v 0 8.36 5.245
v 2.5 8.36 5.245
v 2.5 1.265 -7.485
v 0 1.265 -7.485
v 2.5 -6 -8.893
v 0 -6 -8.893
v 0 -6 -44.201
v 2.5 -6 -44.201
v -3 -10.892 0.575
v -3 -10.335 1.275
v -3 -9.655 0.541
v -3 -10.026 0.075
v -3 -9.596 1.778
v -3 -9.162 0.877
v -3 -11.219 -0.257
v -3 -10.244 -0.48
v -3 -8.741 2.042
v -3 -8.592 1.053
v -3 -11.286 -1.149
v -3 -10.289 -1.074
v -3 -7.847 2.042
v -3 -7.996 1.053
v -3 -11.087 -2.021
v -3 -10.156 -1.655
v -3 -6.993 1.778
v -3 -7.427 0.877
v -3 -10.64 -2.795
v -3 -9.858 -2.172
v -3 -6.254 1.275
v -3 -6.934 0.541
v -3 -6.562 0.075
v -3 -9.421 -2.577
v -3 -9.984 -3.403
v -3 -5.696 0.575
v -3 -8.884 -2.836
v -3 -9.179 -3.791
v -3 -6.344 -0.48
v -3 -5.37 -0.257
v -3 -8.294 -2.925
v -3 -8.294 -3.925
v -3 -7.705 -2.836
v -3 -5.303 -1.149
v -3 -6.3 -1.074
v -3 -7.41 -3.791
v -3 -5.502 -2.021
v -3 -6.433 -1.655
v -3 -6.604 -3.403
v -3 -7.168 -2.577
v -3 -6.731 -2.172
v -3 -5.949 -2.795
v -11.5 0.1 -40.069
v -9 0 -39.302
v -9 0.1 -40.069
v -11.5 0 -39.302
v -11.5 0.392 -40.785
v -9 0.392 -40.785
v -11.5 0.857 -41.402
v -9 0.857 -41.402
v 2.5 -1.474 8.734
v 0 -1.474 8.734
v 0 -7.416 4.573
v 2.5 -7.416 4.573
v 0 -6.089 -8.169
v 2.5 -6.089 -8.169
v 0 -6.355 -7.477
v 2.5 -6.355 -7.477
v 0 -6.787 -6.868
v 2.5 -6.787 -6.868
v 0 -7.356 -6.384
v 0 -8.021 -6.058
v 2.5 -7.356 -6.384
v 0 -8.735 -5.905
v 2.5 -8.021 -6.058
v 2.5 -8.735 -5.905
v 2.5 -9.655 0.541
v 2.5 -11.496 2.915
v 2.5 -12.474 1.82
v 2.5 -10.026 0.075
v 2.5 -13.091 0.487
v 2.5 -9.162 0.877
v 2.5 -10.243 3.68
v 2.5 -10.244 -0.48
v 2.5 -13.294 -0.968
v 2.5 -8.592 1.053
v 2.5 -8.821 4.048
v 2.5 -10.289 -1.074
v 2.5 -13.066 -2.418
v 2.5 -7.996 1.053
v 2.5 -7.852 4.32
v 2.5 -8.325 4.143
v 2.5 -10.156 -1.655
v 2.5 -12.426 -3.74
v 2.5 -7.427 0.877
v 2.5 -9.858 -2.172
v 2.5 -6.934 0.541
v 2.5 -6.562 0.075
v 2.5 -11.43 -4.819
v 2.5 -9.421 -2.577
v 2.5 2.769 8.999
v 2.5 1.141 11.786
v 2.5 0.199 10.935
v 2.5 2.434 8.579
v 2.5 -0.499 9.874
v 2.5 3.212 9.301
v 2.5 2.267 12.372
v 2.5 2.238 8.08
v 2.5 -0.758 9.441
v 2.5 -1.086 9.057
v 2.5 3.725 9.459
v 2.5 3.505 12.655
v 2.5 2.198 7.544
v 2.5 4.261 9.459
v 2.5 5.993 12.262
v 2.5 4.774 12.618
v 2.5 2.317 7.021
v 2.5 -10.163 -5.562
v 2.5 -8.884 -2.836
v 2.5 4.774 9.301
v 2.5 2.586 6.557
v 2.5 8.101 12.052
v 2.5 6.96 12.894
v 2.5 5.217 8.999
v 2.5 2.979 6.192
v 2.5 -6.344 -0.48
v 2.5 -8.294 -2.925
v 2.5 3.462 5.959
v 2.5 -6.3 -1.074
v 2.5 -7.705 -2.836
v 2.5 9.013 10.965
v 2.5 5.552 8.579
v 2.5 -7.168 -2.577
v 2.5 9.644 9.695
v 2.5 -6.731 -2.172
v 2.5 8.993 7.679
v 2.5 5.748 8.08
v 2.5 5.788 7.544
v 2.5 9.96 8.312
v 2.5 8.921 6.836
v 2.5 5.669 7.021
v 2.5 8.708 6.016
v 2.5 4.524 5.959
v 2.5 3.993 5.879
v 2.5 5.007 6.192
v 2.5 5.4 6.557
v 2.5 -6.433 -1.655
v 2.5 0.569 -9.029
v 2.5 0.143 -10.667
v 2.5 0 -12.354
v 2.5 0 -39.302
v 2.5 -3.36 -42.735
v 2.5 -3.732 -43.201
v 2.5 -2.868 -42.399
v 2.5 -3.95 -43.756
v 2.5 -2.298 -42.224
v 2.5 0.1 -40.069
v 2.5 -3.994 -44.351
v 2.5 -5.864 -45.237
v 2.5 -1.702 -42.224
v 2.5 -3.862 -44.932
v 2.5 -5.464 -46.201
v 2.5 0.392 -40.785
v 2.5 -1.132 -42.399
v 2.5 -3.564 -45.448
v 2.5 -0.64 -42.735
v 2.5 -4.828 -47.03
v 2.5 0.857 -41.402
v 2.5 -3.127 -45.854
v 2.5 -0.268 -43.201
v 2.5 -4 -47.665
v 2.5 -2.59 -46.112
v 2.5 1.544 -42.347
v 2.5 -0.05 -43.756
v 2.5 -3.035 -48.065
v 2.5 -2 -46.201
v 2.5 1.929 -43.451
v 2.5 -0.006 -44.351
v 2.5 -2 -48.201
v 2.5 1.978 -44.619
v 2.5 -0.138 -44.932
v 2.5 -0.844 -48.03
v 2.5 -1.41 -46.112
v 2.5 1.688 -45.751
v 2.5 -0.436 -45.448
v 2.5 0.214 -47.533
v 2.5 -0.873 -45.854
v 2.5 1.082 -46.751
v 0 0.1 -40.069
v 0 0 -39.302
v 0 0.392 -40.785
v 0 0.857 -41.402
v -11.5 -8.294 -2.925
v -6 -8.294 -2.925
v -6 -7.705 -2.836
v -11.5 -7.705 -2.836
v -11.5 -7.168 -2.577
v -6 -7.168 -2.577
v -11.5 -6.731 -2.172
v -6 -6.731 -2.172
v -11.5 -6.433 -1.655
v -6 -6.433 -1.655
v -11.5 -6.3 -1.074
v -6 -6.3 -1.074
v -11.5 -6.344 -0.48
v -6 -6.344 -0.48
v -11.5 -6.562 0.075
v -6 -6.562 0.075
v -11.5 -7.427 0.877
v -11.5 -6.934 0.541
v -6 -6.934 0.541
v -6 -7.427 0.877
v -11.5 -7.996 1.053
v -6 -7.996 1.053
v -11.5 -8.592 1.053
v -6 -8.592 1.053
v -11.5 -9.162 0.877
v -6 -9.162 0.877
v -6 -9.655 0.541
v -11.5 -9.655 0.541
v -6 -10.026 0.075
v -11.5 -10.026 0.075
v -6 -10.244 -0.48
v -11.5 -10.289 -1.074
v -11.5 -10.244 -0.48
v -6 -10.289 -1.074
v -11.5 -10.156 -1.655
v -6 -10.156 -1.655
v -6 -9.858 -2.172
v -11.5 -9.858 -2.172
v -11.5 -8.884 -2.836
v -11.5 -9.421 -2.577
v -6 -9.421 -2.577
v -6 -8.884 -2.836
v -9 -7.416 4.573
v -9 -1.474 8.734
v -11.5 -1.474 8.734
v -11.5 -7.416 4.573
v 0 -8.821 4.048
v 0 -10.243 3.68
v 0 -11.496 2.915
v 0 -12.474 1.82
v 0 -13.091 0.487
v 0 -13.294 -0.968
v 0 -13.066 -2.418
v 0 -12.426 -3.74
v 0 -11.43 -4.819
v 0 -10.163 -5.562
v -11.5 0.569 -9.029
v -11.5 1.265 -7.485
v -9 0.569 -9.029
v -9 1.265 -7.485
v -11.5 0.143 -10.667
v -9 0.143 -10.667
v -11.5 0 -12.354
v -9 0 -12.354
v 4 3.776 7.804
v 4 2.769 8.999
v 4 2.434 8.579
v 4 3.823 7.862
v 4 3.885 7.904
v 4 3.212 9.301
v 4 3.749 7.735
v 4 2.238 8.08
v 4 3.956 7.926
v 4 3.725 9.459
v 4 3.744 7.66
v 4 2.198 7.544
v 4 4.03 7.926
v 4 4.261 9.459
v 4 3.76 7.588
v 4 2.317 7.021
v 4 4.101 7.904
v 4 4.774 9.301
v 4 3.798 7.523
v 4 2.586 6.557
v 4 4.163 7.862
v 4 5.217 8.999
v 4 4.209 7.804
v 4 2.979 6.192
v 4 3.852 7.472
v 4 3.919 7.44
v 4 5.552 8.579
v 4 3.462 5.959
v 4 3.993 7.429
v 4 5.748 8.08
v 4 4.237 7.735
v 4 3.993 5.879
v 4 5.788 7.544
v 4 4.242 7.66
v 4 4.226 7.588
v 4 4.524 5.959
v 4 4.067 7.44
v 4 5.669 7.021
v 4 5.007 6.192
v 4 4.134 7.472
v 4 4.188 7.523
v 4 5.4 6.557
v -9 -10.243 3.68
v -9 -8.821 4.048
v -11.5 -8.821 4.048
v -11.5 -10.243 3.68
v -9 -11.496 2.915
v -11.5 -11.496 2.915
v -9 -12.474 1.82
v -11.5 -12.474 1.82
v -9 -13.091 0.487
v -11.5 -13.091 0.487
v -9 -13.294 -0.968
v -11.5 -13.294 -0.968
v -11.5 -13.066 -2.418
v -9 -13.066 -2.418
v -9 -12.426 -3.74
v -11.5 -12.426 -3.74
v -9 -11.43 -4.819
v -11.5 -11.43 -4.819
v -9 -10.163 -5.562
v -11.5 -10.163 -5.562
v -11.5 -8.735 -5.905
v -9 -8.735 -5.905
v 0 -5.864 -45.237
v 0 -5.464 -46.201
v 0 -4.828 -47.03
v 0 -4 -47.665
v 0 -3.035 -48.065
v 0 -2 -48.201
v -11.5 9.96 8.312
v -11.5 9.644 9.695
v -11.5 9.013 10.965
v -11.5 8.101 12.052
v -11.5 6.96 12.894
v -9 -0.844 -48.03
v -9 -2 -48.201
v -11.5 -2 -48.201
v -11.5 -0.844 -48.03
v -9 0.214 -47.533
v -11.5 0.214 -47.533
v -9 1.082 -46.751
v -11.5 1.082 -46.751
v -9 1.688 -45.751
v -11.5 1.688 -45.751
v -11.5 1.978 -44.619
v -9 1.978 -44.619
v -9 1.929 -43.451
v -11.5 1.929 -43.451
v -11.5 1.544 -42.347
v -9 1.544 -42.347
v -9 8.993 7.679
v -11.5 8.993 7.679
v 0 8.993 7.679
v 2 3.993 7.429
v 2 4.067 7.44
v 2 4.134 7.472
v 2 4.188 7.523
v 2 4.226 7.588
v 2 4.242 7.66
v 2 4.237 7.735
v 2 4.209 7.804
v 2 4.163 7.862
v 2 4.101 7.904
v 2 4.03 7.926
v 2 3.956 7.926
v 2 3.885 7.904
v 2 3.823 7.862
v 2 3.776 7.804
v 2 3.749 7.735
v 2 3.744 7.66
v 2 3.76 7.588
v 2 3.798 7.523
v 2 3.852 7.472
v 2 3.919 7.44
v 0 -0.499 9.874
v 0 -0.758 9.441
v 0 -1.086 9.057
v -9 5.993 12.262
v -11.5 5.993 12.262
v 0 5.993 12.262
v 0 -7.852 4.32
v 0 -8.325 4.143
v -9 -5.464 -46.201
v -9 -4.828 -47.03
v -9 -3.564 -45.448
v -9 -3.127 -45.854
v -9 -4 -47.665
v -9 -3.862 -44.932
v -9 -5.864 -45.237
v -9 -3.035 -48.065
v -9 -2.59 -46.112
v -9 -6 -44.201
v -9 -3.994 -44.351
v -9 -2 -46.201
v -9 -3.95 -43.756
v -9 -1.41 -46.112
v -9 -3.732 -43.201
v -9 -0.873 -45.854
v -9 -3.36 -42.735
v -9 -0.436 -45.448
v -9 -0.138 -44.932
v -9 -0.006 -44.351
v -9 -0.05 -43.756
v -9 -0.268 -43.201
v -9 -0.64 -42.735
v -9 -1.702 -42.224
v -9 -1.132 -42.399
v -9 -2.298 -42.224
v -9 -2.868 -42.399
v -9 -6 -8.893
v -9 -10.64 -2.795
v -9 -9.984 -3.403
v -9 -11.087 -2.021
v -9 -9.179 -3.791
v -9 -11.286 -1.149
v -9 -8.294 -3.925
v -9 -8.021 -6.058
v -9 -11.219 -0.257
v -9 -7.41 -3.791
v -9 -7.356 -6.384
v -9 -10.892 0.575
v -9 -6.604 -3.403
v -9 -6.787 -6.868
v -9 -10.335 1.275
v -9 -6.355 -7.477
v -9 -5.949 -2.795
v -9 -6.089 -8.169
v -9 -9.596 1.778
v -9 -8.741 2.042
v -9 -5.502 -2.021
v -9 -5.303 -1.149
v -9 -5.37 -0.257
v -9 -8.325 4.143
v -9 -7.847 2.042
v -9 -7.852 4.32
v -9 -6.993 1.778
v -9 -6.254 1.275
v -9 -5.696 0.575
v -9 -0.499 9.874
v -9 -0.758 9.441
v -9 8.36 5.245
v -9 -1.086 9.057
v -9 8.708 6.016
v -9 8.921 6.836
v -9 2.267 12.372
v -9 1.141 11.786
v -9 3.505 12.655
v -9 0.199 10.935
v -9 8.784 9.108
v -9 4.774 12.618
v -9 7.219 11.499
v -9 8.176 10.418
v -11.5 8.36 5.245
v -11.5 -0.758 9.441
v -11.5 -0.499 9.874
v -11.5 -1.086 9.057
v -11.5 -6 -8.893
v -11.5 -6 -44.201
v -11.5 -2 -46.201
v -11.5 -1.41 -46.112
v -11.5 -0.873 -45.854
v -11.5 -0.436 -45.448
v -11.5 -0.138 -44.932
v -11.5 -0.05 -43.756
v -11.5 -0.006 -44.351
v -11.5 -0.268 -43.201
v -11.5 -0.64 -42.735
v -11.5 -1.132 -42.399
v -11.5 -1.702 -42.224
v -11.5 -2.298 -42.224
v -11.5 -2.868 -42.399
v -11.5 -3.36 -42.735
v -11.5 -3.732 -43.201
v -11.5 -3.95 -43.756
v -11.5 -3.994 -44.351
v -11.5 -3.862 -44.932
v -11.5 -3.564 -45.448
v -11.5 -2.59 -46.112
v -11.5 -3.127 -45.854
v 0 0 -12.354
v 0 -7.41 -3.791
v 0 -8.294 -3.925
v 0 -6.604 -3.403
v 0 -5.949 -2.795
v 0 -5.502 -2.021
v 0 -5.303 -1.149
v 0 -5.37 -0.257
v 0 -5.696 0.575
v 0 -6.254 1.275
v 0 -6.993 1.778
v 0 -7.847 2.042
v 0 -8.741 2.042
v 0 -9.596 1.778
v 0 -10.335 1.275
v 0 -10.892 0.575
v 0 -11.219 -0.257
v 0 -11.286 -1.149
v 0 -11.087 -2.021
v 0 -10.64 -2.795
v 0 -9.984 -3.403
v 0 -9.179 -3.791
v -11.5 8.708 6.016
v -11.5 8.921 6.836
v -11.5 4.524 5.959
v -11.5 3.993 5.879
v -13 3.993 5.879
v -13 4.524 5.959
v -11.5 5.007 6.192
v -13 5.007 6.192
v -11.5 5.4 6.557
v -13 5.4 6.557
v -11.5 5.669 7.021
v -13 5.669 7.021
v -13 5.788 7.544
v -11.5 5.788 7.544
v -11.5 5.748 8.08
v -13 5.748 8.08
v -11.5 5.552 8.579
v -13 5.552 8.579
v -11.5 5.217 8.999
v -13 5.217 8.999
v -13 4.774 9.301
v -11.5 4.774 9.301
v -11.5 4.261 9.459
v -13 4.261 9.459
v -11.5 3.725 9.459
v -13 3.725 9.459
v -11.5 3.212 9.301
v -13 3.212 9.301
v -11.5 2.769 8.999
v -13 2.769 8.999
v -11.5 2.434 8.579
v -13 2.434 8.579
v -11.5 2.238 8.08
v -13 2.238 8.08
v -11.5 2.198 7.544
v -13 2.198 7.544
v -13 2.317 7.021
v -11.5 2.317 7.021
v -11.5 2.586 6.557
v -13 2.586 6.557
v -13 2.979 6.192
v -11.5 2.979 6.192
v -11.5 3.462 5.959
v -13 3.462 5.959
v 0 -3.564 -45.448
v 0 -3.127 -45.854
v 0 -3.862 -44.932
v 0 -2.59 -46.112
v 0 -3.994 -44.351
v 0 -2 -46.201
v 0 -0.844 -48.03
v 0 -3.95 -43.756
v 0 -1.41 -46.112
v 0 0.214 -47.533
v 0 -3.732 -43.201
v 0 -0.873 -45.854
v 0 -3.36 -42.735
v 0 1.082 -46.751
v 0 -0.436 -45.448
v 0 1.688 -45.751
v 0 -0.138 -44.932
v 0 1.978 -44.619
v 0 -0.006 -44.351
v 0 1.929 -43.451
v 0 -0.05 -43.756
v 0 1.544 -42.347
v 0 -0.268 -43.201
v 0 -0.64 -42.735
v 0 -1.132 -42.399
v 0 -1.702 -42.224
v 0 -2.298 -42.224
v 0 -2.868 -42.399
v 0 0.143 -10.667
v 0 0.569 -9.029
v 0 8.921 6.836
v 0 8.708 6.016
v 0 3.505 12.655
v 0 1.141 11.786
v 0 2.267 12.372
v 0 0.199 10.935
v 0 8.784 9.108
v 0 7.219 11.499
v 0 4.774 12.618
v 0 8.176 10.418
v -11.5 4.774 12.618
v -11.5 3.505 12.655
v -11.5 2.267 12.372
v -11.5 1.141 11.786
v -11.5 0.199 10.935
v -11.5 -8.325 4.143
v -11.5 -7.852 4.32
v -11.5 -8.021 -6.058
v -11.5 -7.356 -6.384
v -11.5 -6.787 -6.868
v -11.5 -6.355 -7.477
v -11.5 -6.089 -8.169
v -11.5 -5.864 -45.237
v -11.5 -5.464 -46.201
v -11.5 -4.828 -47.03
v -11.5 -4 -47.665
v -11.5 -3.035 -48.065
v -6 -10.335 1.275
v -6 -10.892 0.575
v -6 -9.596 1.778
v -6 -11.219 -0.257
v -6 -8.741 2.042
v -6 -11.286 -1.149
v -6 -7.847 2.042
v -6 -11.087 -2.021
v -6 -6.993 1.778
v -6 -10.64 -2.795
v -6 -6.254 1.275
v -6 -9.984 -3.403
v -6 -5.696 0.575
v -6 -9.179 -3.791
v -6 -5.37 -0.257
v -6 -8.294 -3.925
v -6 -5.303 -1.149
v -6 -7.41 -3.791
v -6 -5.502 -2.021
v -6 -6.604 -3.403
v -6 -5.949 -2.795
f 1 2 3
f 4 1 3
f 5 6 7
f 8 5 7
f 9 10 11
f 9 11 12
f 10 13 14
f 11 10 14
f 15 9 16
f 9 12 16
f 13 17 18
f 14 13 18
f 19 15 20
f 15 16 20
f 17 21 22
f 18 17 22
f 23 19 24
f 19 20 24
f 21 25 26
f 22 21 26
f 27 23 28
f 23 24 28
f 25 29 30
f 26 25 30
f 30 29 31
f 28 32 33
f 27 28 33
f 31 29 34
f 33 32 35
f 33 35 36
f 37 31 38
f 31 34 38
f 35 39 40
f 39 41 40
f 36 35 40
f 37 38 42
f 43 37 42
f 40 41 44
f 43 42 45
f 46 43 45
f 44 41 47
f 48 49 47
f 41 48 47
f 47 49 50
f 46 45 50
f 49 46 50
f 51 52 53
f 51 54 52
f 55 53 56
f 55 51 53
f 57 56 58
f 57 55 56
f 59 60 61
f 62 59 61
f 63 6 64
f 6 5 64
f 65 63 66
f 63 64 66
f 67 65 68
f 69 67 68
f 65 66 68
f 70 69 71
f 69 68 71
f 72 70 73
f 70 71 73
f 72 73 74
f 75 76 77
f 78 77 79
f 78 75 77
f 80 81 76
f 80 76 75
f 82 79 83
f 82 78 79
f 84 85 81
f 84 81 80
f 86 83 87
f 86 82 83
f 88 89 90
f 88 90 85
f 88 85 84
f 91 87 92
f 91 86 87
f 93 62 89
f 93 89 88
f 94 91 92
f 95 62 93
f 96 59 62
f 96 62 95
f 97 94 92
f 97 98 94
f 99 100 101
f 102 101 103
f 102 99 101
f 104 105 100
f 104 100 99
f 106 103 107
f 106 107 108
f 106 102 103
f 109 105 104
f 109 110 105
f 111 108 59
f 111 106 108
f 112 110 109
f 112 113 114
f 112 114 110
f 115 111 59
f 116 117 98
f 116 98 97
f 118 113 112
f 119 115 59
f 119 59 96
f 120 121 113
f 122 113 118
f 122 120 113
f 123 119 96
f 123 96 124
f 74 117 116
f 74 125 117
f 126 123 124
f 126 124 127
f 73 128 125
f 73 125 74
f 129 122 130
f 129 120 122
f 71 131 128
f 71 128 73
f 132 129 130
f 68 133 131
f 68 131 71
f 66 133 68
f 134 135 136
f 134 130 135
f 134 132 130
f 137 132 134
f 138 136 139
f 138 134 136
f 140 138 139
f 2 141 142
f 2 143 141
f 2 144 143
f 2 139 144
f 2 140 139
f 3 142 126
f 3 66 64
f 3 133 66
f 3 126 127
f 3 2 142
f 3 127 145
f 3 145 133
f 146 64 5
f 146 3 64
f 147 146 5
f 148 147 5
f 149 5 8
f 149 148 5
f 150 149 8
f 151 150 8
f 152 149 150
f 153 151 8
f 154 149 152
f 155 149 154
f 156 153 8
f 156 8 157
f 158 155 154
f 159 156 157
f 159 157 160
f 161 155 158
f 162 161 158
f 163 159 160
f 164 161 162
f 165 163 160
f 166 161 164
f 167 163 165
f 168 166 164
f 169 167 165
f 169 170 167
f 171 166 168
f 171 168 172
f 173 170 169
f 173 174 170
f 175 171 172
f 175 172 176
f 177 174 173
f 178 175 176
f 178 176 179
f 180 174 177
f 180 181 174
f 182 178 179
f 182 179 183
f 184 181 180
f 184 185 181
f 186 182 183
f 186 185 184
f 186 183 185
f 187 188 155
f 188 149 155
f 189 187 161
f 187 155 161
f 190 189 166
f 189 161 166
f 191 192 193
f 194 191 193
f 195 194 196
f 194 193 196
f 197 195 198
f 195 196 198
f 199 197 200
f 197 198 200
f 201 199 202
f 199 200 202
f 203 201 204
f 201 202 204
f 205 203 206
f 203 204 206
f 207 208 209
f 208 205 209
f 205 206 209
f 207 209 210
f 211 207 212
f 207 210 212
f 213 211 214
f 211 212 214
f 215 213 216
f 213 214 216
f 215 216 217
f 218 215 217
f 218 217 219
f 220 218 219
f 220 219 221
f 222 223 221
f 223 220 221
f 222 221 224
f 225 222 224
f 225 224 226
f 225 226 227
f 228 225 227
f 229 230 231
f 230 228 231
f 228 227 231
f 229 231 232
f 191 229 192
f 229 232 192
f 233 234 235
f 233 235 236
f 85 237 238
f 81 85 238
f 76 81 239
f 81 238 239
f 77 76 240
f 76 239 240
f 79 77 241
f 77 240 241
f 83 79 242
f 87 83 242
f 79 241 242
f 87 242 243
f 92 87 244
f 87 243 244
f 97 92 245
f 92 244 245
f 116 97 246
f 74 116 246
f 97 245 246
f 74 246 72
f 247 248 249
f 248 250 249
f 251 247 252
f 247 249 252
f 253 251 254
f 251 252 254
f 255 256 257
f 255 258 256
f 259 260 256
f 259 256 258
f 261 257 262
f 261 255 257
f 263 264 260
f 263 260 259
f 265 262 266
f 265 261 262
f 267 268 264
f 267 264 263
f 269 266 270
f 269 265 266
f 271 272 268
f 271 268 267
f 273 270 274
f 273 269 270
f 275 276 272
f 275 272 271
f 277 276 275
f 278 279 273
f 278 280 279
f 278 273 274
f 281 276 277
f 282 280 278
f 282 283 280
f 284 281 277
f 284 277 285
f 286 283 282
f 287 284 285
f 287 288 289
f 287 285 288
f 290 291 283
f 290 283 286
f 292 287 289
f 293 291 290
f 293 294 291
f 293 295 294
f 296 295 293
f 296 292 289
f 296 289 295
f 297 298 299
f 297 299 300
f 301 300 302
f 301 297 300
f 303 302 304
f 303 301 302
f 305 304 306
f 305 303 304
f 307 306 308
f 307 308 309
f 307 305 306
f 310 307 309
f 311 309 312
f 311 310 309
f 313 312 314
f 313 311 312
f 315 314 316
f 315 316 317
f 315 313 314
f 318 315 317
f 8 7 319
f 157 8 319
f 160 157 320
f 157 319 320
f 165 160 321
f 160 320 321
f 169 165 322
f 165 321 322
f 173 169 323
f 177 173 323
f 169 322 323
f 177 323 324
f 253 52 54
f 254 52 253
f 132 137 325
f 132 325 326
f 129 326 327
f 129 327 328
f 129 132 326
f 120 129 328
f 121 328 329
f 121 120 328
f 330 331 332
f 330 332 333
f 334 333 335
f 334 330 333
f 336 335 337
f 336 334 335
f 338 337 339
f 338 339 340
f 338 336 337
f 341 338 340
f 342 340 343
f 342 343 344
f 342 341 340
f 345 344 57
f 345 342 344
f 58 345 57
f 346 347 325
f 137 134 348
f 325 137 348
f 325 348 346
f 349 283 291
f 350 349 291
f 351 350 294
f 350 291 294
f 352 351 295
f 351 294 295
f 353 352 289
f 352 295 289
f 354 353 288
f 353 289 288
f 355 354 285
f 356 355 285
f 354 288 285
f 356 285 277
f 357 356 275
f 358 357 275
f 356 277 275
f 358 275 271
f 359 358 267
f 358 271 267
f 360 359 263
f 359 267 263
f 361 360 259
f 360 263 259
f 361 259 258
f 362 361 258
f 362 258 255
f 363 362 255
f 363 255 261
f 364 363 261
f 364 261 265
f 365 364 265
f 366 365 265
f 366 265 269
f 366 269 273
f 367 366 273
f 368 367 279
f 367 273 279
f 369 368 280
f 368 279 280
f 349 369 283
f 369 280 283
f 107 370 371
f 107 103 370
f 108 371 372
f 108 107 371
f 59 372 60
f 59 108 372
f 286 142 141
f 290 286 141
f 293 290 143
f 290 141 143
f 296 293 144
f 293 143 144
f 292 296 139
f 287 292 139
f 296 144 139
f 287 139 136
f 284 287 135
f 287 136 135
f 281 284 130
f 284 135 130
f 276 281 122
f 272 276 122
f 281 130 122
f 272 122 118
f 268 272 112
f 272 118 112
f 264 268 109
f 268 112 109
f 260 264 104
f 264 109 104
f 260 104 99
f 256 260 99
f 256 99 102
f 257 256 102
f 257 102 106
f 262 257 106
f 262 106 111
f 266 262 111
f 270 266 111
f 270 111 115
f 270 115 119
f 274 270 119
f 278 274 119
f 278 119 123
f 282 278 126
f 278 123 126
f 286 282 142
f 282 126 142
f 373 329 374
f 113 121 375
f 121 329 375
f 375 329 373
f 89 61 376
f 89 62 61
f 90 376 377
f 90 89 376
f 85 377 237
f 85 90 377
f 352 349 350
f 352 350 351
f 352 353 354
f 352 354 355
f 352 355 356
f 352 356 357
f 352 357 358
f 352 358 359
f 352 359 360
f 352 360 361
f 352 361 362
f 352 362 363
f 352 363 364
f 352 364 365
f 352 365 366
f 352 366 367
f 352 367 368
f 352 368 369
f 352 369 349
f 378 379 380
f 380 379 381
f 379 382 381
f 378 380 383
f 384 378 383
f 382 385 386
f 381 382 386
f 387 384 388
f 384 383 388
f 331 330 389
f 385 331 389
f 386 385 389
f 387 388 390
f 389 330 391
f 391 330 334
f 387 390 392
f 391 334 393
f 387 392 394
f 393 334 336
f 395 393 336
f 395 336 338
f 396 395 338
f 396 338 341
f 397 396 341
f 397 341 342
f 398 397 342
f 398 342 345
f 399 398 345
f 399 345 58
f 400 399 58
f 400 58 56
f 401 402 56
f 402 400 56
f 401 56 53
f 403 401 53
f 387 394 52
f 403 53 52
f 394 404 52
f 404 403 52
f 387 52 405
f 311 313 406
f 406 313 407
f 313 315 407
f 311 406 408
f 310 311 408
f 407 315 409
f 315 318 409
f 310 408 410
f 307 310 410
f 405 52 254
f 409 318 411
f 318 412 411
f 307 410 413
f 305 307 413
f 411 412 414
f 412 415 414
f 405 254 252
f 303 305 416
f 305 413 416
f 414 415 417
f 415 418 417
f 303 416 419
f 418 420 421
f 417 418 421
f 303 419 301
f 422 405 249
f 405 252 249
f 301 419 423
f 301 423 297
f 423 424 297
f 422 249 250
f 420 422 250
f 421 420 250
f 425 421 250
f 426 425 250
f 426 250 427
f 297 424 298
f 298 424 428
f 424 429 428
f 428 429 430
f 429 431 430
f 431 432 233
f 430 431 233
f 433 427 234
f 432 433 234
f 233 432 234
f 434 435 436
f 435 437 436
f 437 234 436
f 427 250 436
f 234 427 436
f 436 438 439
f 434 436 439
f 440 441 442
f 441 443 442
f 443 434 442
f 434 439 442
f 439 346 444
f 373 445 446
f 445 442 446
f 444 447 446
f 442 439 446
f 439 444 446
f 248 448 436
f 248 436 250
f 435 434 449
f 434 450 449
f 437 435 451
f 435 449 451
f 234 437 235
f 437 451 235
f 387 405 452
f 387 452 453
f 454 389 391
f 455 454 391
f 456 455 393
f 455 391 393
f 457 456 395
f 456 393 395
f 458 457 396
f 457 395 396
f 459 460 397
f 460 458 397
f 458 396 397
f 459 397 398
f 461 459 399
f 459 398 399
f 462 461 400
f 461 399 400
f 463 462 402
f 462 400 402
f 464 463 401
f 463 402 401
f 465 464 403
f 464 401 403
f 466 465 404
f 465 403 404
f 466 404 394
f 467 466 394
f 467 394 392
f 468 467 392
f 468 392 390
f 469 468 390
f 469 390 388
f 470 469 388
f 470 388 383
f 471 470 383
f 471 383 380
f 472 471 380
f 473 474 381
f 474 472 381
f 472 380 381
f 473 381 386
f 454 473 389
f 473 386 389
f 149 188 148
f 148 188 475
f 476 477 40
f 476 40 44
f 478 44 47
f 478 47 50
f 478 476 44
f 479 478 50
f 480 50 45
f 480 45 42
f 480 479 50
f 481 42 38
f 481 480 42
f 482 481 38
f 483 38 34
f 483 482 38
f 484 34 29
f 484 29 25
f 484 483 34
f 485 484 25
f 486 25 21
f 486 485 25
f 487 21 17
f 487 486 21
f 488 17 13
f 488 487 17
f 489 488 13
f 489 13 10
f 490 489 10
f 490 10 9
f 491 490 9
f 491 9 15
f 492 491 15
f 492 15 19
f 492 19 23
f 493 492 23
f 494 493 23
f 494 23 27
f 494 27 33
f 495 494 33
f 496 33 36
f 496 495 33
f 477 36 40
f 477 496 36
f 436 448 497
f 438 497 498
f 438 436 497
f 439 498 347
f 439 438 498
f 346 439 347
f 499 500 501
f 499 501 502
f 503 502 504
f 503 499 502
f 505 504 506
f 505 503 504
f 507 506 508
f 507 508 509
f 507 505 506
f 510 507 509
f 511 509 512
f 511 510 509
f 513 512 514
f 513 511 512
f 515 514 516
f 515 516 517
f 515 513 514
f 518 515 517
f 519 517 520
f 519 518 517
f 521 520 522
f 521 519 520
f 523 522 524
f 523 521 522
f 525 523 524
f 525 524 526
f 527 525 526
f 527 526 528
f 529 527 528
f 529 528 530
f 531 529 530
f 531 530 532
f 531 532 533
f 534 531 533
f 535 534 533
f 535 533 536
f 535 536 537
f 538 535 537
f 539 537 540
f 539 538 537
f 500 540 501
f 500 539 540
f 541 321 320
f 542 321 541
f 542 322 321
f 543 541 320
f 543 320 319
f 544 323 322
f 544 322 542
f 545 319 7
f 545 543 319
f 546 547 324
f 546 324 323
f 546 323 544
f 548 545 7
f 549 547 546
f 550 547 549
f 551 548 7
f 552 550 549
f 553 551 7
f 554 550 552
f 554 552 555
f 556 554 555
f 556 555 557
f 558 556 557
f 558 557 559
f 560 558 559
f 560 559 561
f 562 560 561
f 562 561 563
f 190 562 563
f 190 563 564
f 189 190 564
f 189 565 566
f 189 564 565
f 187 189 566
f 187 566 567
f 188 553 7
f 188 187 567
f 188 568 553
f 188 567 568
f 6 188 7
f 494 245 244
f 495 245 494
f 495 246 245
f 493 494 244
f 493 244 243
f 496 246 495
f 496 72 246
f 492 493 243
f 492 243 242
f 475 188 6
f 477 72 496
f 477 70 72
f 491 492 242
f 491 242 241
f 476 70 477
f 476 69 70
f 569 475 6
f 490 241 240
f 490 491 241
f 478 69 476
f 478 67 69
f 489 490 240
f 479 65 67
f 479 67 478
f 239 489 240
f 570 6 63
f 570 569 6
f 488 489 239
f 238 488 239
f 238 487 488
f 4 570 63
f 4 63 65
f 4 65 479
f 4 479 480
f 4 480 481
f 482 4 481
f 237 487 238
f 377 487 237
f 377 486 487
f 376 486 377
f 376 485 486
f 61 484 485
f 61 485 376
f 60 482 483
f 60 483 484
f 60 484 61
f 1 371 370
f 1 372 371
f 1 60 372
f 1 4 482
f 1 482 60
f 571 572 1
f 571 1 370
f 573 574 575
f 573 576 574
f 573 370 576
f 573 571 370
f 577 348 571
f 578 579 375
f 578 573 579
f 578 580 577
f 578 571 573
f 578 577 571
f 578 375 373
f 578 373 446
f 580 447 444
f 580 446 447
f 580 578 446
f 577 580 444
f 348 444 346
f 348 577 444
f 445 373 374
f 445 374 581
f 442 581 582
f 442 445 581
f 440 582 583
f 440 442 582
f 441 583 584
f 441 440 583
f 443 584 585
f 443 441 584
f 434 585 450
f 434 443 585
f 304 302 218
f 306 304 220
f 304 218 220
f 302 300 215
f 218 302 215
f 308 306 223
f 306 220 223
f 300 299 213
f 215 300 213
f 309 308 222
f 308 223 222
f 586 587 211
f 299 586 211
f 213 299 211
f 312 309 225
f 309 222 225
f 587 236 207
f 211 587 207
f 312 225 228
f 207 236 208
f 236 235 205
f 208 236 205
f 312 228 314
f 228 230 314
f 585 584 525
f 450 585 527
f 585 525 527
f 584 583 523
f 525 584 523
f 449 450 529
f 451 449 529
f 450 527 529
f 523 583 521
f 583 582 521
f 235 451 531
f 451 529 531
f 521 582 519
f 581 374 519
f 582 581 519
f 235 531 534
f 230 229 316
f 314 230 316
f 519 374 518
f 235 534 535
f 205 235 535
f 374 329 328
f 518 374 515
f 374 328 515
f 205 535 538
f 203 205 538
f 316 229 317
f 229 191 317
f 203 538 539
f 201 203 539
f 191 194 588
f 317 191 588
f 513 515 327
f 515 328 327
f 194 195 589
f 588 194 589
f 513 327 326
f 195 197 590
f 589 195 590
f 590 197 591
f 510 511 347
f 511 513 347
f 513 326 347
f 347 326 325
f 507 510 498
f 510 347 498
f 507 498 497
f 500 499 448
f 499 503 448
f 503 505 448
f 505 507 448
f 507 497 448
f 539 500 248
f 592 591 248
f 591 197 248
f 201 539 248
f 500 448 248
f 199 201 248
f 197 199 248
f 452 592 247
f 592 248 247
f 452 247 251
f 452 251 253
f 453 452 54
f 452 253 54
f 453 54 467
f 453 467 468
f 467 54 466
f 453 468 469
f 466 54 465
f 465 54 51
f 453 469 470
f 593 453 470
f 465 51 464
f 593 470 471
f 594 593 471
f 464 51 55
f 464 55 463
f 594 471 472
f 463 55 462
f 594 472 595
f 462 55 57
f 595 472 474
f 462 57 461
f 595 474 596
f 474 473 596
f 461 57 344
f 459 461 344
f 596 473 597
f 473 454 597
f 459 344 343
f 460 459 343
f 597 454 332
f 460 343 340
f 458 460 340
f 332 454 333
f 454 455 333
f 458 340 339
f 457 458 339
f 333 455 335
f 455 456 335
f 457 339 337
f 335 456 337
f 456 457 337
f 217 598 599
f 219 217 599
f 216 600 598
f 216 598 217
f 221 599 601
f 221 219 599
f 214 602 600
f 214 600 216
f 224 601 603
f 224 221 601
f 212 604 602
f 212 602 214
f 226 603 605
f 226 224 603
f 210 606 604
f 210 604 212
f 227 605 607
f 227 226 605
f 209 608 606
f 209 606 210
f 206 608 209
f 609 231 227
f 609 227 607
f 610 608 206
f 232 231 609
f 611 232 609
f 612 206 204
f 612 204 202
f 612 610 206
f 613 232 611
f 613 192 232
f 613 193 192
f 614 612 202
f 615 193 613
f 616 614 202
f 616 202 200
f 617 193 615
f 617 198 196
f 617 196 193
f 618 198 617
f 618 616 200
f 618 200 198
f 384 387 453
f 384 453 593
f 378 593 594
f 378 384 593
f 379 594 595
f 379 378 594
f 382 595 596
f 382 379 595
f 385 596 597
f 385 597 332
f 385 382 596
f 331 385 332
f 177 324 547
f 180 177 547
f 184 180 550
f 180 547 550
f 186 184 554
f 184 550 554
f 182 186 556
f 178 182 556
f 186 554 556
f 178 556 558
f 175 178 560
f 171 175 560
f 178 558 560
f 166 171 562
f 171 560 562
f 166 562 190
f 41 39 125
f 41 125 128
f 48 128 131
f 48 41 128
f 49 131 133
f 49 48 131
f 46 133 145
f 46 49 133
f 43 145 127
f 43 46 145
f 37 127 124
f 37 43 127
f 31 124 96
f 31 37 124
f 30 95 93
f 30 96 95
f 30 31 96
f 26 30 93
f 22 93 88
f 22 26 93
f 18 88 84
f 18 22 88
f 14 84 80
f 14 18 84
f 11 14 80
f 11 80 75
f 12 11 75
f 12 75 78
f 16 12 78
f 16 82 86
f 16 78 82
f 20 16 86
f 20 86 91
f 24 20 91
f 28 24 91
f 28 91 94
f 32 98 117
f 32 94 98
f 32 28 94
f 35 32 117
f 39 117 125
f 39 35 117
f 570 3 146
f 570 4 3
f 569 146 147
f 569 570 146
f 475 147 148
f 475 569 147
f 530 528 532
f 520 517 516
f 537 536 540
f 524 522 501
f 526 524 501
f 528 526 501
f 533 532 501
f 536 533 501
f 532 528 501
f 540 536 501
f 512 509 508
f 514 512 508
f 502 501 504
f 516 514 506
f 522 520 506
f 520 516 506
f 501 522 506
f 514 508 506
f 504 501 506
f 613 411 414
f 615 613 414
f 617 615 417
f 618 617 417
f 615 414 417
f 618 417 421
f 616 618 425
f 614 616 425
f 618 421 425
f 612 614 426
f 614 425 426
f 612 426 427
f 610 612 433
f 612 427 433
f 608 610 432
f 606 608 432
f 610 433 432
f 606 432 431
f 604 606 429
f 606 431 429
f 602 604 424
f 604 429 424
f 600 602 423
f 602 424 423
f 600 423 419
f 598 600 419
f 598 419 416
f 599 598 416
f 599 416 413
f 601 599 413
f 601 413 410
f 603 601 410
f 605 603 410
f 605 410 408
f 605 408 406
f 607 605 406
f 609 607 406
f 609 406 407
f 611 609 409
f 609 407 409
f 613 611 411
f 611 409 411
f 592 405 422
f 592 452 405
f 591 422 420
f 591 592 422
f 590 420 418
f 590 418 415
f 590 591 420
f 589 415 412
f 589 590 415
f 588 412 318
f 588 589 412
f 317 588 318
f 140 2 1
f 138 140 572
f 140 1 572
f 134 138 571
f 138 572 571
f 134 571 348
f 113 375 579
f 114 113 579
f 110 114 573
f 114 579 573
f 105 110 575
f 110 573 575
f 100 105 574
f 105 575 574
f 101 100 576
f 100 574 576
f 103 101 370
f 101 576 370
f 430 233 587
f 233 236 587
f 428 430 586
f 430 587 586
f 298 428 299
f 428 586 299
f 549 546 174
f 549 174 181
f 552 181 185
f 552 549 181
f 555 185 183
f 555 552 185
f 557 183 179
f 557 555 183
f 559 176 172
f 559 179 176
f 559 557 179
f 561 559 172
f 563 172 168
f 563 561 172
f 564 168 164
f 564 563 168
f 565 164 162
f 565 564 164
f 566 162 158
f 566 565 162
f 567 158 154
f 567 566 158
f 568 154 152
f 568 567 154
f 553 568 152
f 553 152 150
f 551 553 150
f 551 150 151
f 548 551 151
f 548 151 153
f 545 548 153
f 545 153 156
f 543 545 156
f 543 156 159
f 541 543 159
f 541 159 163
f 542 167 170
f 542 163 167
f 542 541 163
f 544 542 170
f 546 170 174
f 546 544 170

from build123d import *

# Parameters (mm, degrees)
EXTRUDE_1_DEPTH          = 2.5
SKETCH_1_4_R             = 3
EXTRUDE_2_DEPTH          = 3
CUT_EXTRUDE_1_DEPTH      = 51.090903435
CUT_EXTRUDE_1_DEPTH_BACK = 51.090903435
SKETCH_1_3_R             = 2
FILLET_1_R               = 3
EXTRUDE_START            = -2.5
SKETCH_2_R               = 2
EXTRUDE_3_DEPTH          = 2.5
SKETCH_2_3_R             = 1.8
EXTRUDE_4_DEPTH          = 1.5
EXTRUDE_6_DEPTH          = 2.5
EXTRUDE_START_2          = -7
EXTRUDE_5_DEPTH          = 7
FILLET_3_R               = 10
SKETCH_5_R               = 0.25
CUT_EXTRUDE_2_DEPTH      = 2


with BuildPart() as part:
    # 草图1 → 凸台-拉伸1 (new body)
    with BuildSketch(Plane(origin=(0, 0, 0), x_dir=(0, 0, -1), z_dir=(1, 0, 0))):
        with BuildLine():
            Line((40.737143614, 0), (0, 0))
            Line((0, 0), (2.48051592, -3.542543867))
            ThreePointArc((2.48051592, -3.542543867), (4.165783411, -4.487079684), (5.367176995, -6))
            Line((5.367176995, -6), (44.201245229, -6))
            ThreePointArc((44.201245229, -6), (40.737143614, -4), (40.737143614, 0))
        make_face()
        with BuildLine():
            Line((2.48051592, -3.542543867), (0, 0))
            Line((0, 0), (-2.681672007, 3.829824531))
            ThreePointArc((-2.681672007, 3.829824531), (-4.811127311, -0.102785303), (-9.234888361, -0.758786959))
            Line((-9.234888361, -0.758786959), (-4.072700434, -8.131155358))
            ThreePointArc((-4.072700434, -8.131155358), (-1.94324513, -4.198545524), (2.48051592, -3.542543867))
        make_face()
        with BuildLine():
            ThreePointArc((48.201245229, -2), (45.23652141, 1.863703305), (40.737143614, 0))
            Line((40.737143614, 0), (44.201245229, 0))
            ThreePointArc((44.201245229, 0), (45.615458792, -0.585786438), (46.201245229, -2))
            ThreePointArc((46.201245229, -2), (45.615458792, -3.414213562), (44.201245229, -4))
            Line((44.201245229, -4), (44.201245229, -6))
            ThreePointArc((44.201245229, -6), (47.029672354, -4.828427125), (48.201245229, -2))
        make_face()
        with BuildLine():
            Line((44.201245229, 0), (40.737143614, 0))
            ThreePointArc((40.737143614, 0), (40.737143614, -4), (44.201245229, -6))
            Line((44.201245229, -6), (44.201245229, -4))
            ThreePointArc((44.201245229, -4), (42.201245229, -2), (44.201245229, 0))
        make_face()
        with BuildLine():
            ThreePointArc((5.367176995, -6), (4.165783411, -4.487079684), (2.48051592, -3.542543867))
            Line((2.48051592, -3.542543867), (4.201245229, -6))
            Line((4.201245229, -6), (5.367176995, -6))
        make_face()
        with BuildLine():
            Line((4.201245229, -6), (2.48051592, -3.542543867))
            ThreePointArc((2.48051592, -3.542543867), (-1.94324513, -4.198545524), (-4.072700434, -8.131155358))
            Line((-4.072700434, -8.131155358), (-2.351971125, -10.588611491))
            Line((-2.351971125, -10.588611491), (-1.532819081, -10.015035054))
            ThreePointArc((-1.532819081, -10.015035054), (-0.796092257, -5.836849613), (3.382093185, -6.573576436))
            Line((3.382093185, -6.573576436), (4.201245229, -6))
        make_face()
        with BuildLine():
            ThreePointArc((-9.234888361, -0.758786959), (-4.811127311, -0.102785303), (-2.681672007, 3.829824531))
            Line((-2.681672007, 3.829824531), (-4.402401316, 6.287280664))
            Line((-4.402401316, 6.287280664), (-6.040705405, 5.140127792))
            ThreePointArc((-6.040705405, 5.140127792), (-5.771575592, 4.594386518), (-5.679009493, 3.992974919))
            ThreePointArc((-5.679009493, 3.992974919), (-7.077597894, 2.085541017), (-9.317313582, 2.845822046))
            Line((-9.317313582, 2.845822046), (-10.95561767, 1.698669174))
            Line((-10.95561767, 1.698669174), (-9.234888361, -0.758786959))
        make_face()
        with BuildLine():
            Line((-4.402401316, 6.287280664), (-2.681672007, 3.829824531))
            ThreePointArc((-2.681672007, 3.829824531), (-2.679675166, 3.911388863), (-2.679009493, 3.992974919))
            ThreePointArc((-2.679009493, 3.992974919), (-10.613341245, 8.041394014), (-9.234888361, -0.758786959))
            Line((-9.234888361, -0.758786959), (-10.95561767, 1.698669174))
            Line((-10.95561767, 1.698669174), (-9.317313582, 2.845822046))
            ThreePointArc((-9.317313582, 2.845822046), (-8.826162366, 5.631279008), (-6.040705405, 5.140127792))
            Line((-6.040705405, 5.140127792), (-4.402401316, 6.287280664))
        make_face()
        with BuildLine():
            ThreePointArc((46.201245229, -2), (45.615458792, -0.585786438), (44.201245229, 0))
            Line((44.201245229, 0), (44.201245229, -4))
            ThreePointArc((44.201245229, -4), (45.615458792, -3.414213562), (46.201245229, -2))
        make_face()
        with BuildLine():
            Line((44.201245229, -4), (44.201245229, 0))
            ThreePointArc((44.201245229, 0), (42.201245229, -2), (44.201245229, -4))
        make_face()
        with BuildLine():
            Line((5.367176995, -6), (4.201245229, -6))
            Line((4.201245229, -6), (3.382093185, -6.573576436))
            ThreePointArc((3.382093185, -6.573576436), (3.785787904, -7.392188347), (3.924637052, -8.294305745))
            ThreePointArc((3.924637052, -8.294305745), (1.826754451, -11.155456598), (-1.532819081, -10.015035054))
            Line((-1.532819081, -10.015035054), (-2.351971125, -10.588611491))
            Line((-2.351971125, -10.588611491), (-4.072700434, -8.131155358))
            ThreePointArc((-4.072700434, -8.131155358), (0.843050996, -13.293640073), (5.924637052, -8.294305745))
            ThreePointArc((5.924637052, -8.294305745), (5.783273678, -7.113776143), (5.367176995, -6))
        make_face()
        with BuildLine():
            ThreePointArc((3.924637052, -8.294305745), (3.785787904, -7.392188347), (3.382093185, -6.573576436))
            Line((3.382093185, -6.573576436), (2.562941141, -7.147152873))
            ThreePointArc((2.562941141, -7.147152873), (2.832070954, -7.692894146), (2.924637052, -8.294305745))
            ThreePointArc((2.924637052, -8.294305745), (1.526048651, -10.201739647), (-0.713667036, -9.441458618))
            Line((-0.713667036, -9.441458618), (-1.532819081, -10.015035054))
            ThreePointArc((-1.532819081, -10.015035054), (1.826754451, -11.155456598), (3.924637052, -8.294305745))
        make_face()
        with BuildLine():
            Line((2.562941141, -7.147152873), (3.382093185, -6.573576436))
            ThreePointArc((3.382093185, -6.573576436), (-0.796092257, -5.836849613), (-1.532819081, -10.015035054))
            Line((-1.532819081, -10.015035054), (-0.713667036, -9.441458618))
            ThreePointArc((-0.713667036, -9.441458618), (-0.222515821, -6.656001657), (2.562941141, -7.147152873))
        make_face()
        with BuildLine():
            ThreePointArc((-5.679009493, 3.992974919), (-5.771575592, 4.594386518), (-6.040705405, 5.140127792))
            Line((-6.040705405, 5.140127792), (-9.317313582, 2.845822046))
            ThreePointArc((-9.317313582, 2.845822046), (-7.077597894, 2.085541017), (-5.679009493, 3.992974919))
        make_face()
        with BuildLine():
            Line((-9.317313582, 2.845822046), (-6.040705405, 5.140127792))
            ThreePointArc((-6.040705405, 5.140127792), (-8.826162366, 5.631279008), (-9.317313582, 2.845822046))
        make_face()
        with BuildLine():
            ThreePointArc((2.924637052, -8.294305745), (2.832070954, -7.692894146), (2.562941141, -7.147152873))
            Line((2.562941141, -7.147152873), (-0.713667036, -9.441458618))
            ThreePointArc((-0.713667036, -9.441458618), (1.526048651, -10.201739647), (2.924637052, -8.294305745))
        make_face()
        with BuildLine():
            Line((-0.713667036, -9.441458618), (2.562941141, -7.147152873))
            ThreePointArc((2.562941141, -7.147152873), (-0.222515821, -6.656001657), (-0.713667036, -9.441458618))
        make_face()
    extrude(amount=EXTRUDE_1_DEPTH)

    # 草图1<4> → 凸台-拉伸2 (add)
    with BuildSketch(Plane(origin=(0, 0, 0), x_dir=(0, 0, -1), z_dir=(1, 0, 0))):
        with Locations((0.924637052, -8.294305745)):
            Circle(SKETCH_1_4_R)
    extrude(amount=-EXTRUDE_2_DEPTH)

    # 草图1<3> → 切除-拉伸1 (cut, two sides: drawn at the far end of the back side and taken through both)
    with BuildSketch(Plane(origin=(0, 0, 0), x_dir=(0, 0, -1), z_dir=(1, 0, 0)).offset(-CUT_EXTRUDE_1_DEPTH_BACK)):
        with Locations((-7.679009493, 3.992974919)):
            Circle(SKETCH_1_3_R)
        with Locations((44.201245229, -2)):
            Circle(SKETCH_1_3_R)
        with Locations((0.924637052, -8.294305745)):
            Circle(SKETCH_1_3_R)
    extrude(amount=CUT_EXTRUDE_1_DEPTH + CUT_EXTRUDE_1_DEPTH_BACK, mode=Mode.SUBTRACT)

    # 圆角1
    fillet_1_edges = [part.edges().sort_by_distance(p)[0] for p in [
        (1.25, -6, -5.367176995),
        (1.25, 0, 0),
        (1.25, 0, -40.737143614),
        (1.25, -0.758786959, 9.234888361),
        (1.25, -8.131155358, 4.072700434),
    ]]
    fillet(fillet_1_edges, radius=FILLET_1_R)

    # 草图2 → 凸台-拉伸3 (add)
    with BuildSketch(Plane(origin=(2.5, 0, 0), x_dir=(0, 0, -1), z_dir=(1, 0, 0)).offset(EXTRUDE_START)):
        with Locations((-7.679009493, 3.992974919)):
            Circle(SKETCH_2_R)
    extrude(amount=EXTRUDE_3_DEPTH)

    # 草图2<3> → 凸台-拉伸4 (add)
    with BuildSketch(Plane(origin=(2.5, 0, 0), x_dir=(0, 0, -1), z_dir=(1, 0, 0))):
        with Locations((-7.679009493, 3.992974919)):
            Circle(SKETCH_2_3_R)
    extrude(amount=EXTRUDE_4_DEPTH)

    # 草图4 → 凸台-拉伸6 (add)
    with BuildSketch(Plane(origin=(2.5, 0, 0), x_dir=(0, 0, -1), z_dir=(1, 0, 0))):
        Polygon((-5.244772745, 8.360410259), (9.755227255, 0), (-5.244772745, 0), align=None)
    extrude(amount=-EXTRUDE_6_DEPTH)

    # 草图3 → 凸台-拉伸5 (add)
    with BuildSketch(Plane(origin=(2.5, 0, 0), x_dir=(0, 0, -1), z_dir=(1, 0, 0)).offset(EXTRUDE_START_2)):
        with BuildLine():
            Line((-12.894335644, 6.959517206), (-12.261585188, 5.992974919))
            ThreePointArc((-12.261585188, 5.992974919), (-10.417622281, 8.176275052), (-7.679009493, 8.992974919))
            Line((-7.679009493, 8.992974919), (-8.311759949, 9.959517206))
            ThreePointArc((-8.311759949, 9.959517206), (-10.965344838, 9.012935078), (-12.894335644, 6.959517206))
        make_face()
    extrude(amount=EXTRUDE_5_DEPTH)

    # 圆角3
    fillet_3_edges = [part.edges().sort_by_distance(p)[0] for p in [
        (1.25, 0, -9.755227255),
    ]]
    fillet(fillet_3_edges, radius=FILLET_3_R)

    # 镜向1: part across plane


with BuildPart() as part_1:
    add(part.part)
    add(part.part.mirror(Plane.ZY.offset(4.5)))

    # 草图5 → 切除-拉伸2 (cut)
    with BuildSketch(Plane(origin=(4, 0, 0), x_dir=(0, 0, -1), z_dir=(1, 0, 0))):
        with Locations((-7.679009493, 3.992974919)):
            Circle(SKETCH_5_R)
    extrude(amount=-CUT_EXTRUDE_2_DEPTH, mode=Mode.SUBTRACT)


solid = part_1.part
